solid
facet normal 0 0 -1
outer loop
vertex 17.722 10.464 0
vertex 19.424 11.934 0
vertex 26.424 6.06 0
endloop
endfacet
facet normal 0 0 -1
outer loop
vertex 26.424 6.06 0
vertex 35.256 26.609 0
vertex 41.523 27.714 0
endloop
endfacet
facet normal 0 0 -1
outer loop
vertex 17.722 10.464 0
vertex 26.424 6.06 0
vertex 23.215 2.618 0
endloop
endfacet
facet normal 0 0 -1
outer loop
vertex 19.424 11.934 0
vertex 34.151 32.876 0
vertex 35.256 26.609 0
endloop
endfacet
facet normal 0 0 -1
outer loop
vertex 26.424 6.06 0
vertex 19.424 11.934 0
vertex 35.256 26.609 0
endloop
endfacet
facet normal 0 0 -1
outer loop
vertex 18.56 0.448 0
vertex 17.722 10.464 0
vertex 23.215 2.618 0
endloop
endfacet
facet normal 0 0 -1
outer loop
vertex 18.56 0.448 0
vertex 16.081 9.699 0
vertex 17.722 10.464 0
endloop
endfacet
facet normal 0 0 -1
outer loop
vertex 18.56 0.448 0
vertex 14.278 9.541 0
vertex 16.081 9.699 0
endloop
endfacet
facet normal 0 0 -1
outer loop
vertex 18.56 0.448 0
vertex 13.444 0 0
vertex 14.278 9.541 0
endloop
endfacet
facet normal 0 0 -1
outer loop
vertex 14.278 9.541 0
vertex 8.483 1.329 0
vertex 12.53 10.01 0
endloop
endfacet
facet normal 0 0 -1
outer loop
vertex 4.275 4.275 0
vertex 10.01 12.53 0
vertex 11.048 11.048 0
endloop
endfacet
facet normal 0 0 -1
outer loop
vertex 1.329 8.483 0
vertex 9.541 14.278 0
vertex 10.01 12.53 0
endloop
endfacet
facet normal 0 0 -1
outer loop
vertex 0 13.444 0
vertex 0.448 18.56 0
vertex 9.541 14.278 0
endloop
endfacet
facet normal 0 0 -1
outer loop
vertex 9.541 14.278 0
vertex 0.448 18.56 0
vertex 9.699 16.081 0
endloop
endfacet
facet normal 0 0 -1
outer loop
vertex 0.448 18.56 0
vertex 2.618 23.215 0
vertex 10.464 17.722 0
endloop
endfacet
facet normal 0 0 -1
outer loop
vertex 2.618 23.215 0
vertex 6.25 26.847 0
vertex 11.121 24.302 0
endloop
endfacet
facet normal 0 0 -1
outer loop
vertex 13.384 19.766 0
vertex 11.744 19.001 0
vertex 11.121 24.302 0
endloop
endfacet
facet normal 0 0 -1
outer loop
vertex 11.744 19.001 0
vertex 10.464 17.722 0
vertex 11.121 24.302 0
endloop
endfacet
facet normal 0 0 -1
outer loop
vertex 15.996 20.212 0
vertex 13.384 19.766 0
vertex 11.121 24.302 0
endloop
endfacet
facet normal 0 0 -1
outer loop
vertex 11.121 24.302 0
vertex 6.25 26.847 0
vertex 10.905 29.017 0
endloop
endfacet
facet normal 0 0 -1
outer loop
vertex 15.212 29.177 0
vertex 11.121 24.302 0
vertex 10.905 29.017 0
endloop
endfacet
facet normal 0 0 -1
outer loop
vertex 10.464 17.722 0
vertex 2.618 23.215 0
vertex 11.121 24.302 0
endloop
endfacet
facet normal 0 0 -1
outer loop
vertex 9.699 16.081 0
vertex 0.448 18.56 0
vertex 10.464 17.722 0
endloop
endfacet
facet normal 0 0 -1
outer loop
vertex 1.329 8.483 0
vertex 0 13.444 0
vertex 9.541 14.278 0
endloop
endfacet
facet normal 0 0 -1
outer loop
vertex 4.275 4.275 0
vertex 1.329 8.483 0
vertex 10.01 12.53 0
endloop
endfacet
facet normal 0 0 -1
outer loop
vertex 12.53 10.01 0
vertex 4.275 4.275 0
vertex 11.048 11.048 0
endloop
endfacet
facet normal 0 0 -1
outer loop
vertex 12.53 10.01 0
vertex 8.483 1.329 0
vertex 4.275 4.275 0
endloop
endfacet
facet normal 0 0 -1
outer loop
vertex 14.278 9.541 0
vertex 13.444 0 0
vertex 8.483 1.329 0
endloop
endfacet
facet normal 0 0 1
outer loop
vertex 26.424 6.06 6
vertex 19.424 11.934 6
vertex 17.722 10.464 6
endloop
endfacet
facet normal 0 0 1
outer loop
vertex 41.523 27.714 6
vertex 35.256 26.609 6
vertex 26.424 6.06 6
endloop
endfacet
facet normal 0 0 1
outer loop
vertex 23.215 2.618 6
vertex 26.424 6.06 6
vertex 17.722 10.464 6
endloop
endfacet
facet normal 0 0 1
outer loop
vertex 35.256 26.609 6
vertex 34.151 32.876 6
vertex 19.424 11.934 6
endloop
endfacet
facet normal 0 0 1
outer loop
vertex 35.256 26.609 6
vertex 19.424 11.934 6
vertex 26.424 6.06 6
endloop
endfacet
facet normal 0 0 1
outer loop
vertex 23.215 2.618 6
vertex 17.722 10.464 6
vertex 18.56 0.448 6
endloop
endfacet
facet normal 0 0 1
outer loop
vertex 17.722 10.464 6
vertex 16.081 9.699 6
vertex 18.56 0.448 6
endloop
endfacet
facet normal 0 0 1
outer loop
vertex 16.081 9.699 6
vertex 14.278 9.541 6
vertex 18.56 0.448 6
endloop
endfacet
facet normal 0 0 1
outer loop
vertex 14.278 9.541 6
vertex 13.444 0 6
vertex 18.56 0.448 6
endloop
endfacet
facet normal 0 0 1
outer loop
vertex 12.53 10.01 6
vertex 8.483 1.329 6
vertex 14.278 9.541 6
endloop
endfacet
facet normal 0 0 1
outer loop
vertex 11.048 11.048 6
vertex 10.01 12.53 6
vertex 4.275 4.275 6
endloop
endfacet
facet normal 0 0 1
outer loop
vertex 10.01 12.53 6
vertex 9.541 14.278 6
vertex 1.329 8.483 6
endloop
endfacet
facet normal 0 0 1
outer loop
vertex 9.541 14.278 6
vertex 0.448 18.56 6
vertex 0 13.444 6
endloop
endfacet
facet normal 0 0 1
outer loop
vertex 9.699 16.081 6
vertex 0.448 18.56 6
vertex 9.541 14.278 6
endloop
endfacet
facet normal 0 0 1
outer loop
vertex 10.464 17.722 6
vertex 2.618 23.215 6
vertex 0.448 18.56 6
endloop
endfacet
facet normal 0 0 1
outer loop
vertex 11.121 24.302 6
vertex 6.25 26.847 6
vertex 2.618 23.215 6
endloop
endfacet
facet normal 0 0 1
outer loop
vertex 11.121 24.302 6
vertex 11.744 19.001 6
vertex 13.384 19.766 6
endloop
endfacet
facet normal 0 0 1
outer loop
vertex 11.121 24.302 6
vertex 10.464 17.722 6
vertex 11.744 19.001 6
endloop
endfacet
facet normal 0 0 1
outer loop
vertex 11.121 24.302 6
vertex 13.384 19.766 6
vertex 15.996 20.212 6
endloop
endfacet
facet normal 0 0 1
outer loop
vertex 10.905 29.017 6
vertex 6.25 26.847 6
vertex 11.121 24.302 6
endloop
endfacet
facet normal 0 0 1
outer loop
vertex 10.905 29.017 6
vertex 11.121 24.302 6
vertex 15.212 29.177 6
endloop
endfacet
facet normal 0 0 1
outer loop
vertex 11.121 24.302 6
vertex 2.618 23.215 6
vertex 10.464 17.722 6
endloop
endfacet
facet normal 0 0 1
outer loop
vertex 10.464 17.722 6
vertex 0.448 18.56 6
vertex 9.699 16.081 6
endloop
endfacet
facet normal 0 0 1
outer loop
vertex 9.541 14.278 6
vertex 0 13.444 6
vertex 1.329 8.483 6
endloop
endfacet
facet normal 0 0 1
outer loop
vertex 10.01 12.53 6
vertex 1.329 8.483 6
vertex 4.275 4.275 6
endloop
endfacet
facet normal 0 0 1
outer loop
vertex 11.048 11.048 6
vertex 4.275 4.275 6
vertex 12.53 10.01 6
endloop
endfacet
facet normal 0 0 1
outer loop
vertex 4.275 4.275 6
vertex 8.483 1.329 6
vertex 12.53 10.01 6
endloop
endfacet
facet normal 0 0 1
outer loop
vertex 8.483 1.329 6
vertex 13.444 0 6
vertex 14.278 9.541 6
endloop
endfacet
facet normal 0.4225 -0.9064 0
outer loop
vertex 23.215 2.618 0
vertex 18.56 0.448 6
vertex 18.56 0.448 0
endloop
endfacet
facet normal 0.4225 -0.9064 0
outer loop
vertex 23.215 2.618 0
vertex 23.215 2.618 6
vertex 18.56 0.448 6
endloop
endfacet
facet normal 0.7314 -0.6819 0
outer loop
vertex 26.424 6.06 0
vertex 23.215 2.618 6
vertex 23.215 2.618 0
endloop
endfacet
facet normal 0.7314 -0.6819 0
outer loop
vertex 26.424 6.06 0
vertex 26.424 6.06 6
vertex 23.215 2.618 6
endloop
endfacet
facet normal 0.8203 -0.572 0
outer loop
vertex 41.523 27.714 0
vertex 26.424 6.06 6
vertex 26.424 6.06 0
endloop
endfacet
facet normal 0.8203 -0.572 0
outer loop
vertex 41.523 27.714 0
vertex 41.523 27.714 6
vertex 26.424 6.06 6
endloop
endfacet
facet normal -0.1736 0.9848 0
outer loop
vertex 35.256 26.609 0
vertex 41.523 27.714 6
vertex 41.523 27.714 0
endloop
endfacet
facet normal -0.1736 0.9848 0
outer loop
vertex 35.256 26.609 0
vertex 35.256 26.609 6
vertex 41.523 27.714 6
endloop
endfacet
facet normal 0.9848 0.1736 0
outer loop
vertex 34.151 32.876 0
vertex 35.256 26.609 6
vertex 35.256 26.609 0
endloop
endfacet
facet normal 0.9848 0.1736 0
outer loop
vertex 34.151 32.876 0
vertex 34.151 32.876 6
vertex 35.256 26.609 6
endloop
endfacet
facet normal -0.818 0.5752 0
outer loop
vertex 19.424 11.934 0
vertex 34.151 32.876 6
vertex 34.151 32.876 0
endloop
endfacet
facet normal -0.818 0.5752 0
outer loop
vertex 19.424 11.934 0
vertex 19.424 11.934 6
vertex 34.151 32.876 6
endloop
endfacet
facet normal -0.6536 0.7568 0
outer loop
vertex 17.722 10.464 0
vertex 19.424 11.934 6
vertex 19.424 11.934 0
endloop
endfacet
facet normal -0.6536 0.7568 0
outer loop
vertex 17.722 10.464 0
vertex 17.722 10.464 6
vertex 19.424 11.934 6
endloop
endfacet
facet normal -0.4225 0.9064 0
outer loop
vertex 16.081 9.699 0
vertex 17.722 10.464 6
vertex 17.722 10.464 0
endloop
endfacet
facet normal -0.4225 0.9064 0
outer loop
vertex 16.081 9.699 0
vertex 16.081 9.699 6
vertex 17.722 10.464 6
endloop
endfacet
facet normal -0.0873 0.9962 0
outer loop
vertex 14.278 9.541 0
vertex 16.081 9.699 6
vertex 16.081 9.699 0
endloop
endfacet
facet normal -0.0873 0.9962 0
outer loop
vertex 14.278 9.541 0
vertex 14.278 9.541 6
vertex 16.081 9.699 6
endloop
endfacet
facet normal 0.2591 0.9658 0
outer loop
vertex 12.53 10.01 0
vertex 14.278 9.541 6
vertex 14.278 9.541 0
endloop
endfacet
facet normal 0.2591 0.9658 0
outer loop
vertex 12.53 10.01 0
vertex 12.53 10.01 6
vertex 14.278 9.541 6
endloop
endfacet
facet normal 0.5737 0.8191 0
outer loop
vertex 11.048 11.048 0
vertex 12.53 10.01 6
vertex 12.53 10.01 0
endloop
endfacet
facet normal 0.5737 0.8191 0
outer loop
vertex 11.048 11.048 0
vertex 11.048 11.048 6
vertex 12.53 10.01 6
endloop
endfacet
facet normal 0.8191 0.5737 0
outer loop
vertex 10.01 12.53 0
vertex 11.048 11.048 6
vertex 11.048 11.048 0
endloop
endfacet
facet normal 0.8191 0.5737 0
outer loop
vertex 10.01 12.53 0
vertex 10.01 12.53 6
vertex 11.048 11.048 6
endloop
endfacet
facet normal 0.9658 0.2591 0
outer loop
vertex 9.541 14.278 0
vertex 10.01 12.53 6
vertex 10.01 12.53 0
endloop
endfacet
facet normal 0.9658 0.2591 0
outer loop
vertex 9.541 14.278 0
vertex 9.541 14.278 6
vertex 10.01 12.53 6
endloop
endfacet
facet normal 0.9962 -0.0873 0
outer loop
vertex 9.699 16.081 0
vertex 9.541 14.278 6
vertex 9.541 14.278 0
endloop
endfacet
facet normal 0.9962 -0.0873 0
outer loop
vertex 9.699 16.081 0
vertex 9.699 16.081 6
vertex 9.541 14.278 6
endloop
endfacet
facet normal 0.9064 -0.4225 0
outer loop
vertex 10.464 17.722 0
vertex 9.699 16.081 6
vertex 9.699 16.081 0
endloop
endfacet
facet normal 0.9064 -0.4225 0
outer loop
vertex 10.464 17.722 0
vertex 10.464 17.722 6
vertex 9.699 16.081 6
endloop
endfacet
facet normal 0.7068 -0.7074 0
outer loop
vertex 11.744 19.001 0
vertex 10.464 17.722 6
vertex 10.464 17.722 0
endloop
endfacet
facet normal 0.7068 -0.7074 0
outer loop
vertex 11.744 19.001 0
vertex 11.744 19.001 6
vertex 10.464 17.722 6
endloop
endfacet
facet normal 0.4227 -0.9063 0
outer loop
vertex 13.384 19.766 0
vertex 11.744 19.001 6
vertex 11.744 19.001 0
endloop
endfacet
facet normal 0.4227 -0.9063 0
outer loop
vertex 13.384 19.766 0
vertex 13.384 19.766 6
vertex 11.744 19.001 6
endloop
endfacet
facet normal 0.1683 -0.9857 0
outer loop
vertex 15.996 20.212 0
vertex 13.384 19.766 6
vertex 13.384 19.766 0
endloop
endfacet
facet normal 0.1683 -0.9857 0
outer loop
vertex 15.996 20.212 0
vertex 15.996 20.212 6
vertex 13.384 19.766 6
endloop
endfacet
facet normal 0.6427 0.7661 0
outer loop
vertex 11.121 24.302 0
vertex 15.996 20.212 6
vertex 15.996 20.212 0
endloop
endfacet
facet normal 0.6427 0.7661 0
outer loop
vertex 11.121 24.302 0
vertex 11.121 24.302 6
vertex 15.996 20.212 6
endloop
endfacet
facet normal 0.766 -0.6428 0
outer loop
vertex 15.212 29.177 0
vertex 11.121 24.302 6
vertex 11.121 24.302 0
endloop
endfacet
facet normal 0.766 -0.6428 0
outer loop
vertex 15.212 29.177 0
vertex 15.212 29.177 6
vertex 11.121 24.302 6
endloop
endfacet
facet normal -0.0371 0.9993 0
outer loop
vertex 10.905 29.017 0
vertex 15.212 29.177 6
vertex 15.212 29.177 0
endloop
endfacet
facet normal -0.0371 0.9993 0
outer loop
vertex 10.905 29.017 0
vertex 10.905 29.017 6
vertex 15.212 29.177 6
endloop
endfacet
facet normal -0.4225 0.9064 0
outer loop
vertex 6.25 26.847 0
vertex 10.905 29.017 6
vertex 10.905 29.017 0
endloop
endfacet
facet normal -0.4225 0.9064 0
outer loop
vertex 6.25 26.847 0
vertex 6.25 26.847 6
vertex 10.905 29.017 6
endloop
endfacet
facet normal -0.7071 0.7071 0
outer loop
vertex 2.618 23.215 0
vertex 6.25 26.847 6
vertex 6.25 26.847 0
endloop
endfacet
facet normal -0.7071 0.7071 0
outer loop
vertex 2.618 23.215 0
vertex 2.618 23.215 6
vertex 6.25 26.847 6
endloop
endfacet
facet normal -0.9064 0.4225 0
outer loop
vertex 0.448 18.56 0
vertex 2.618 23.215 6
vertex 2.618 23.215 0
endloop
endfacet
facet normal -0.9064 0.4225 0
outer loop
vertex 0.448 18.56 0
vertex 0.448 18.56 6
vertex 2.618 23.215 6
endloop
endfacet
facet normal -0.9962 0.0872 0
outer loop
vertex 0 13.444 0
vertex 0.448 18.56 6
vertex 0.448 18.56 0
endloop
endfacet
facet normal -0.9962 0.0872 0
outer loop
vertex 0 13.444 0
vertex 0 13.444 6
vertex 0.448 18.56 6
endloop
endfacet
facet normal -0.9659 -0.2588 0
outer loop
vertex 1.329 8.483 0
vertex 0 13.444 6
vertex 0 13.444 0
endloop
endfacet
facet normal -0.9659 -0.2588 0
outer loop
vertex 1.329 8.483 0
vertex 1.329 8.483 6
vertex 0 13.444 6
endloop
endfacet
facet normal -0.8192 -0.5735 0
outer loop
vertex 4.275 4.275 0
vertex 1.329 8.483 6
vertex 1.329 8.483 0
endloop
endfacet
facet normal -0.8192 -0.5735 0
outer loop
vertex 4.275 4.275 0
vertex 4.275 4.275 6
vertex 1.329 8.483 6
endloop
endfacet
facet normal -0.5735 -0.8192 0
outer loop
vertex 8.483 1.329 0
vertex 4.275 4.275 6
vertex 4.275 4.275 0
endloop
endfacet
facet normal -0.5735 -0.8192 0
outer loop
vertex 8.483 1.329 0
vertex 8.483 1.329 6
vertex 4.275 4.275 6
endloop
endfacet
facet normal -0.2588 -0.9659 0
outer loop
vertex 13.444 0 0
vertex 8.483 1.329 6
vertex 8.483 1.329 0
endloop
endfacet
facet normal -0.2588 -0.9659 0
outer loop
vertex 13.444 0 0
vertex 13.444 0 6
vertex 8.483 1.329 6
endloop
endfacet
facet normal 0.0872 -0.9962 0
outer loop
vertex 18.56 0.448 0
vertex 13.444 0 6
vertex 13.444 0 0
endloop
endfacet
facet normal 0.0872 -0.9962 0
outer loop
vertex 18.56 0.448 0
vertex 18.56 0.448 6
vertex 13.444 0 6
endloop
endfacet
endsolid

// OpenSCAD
$fn = 32;

// ----------------------------------------------------------------------
// Eye lug: ring_tail, 6 mm thick
// ----------------------------------------------------------------------

// --- parameters (mm) ---
profile_height = 6;       // extrusion height
profile_points = 30;      // points of the closed outline

profile = [[11.121, 24.302], [15.212, 29.177], [10.905, 29.017], [6.25, 26.847], [2.618, 23.215], [0.448, 18.56], [0, 13.444], [1.329, 8.483], [4.275, 4.275], [8.483, 1.329], [13.444, 0], [18.56, 0.448], [23.215, 2.618], [26.424, 6.06], [41.523, 27.714], [35.256, 26.609], [34.151, 32.876], [19.424, 11.934], [17.722, 10.464], [16.081, 9.699], [14.278, 9.541], [12.53, 10.01], [11.048, 11.048], [10.01, 12.53], [9.541, 14.278], [9.699, 16.081], [10.464, 17.722], [11.744, 19.001], [13.384, 19.766], [15.996, 20.212]];  // single closed polygon, 30 points, counter clockwise

// --- the one profile operation ---
linear_extrude(height = profile_height) polygon(points = profile);
